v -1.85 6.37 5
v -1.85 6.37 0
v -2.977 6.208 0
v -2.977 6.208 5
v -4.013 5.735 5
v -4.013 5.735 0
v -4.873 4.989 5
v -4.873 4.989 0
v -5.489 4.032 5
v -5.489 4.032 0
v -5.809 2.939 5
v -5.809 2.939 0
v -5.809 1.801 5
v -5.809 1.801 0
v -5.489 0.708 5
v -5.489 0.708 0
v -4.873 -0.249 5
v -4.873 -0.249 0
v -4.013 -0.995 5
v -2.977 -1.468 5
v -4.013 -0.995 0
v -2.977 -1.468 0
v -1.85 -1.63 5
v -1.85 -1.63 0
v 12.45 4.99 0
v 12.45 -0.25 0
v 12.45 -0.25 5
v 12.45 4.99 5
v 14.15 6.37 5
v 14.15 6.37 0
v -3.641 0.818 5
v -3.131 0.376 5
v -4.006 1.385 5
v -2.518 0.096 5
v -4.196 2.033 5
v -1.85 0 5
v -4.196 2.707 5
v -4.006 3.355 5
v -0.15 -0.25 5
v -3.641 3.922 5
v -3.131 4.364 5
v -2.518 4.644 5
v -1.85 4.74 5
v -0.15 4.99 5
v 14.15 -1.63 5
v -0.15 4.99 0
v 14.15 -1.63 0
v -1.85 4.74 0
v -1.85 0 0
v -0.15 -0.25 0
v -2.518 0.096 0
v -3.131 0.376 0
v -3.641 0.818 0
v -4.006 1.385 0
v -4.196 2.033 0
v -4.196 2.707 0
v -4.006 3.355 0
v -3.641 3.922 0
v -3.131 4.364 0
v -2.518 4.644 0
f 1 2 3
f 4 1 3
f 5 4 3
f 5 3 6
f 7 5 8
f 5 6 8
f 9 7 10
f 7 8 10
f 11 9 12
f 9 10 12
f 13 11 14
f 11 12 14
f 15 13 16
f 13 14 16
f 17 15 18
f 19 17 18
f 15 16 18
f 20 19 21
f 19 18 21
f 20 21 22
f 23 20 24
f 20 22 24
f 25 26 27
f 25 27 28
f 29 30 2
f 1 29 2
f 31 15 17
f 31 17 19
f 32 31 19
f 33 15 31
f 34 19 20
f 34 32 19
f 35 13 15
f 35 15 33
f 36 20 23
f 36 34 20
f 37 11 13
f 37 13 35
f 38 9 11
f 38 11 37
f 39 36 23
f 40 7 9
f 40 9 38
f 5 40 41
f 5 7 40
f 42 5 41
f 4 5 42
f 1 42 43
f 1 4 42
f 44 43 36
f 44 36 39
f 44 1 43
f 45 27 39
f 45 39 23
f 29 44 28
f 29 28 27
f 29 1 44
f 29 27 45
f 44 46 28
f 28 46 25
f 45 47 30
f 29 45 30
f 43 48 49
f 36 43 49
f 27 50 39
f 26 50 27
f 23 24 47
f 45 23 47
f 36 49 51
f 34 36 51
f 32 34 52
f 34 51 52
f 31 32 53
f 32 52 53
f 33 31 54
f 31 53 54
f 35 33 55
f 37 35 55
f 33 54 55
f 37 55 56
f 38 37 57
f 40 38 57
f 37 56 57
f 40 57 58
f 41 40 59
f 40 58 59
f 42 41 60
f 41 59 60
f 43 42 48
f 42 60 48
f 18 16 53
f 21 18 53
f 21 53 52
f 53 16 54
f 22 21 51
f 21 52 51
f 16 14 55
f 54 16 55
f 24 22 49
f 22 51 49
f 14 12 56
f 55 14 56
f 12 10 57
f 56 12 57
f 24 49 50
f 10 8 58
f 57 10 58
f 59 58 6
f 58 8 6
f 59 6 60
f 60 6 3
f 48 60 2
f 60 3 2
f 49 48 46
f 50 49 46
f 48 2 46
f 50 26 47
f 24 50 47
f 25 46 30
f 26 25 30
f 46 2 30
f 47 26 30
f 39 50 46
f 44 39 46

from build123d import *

# Parameters (mm, degrees)
F0_W     = 12.6
F0_H     = 5.24
F1_DEPTH = 5


with BuildPart() as f1:
    # F0 (on Top) → F1 (new body)
    with BuildSketch(Plane.XY):
        with Locations((6.15, 2.37)):
            Rectangle(F0_W, F0_H)
        with BuildLine():
            ThreePointArc((-1.85, 6.37), (-5.85, 2.37), (-1.85, -1.63))
            Line((-1.85, -1.63), (14.15, -1.63))
            Line((14.15, -1.63), (14.15, 6.37))
            Line((14.15, 6.37), (-1.85, 6.37))
        make_face()
        with BuildLine():
            Line((-1.85, 4.74), (-1.85, 0))
            ThreePointArc((-1.85, 0), (-4.22, 2.37), (-1.85, 4.74))
        make_face(mode=Mode.SUBTRACT)
        with Locations((6.15, 2.37)):
            Rectangle(F0_W, F0_H, mode=Mode.SUBTRACT)
    extrude(amount=F1_DEPTH)


solid = f1.part
